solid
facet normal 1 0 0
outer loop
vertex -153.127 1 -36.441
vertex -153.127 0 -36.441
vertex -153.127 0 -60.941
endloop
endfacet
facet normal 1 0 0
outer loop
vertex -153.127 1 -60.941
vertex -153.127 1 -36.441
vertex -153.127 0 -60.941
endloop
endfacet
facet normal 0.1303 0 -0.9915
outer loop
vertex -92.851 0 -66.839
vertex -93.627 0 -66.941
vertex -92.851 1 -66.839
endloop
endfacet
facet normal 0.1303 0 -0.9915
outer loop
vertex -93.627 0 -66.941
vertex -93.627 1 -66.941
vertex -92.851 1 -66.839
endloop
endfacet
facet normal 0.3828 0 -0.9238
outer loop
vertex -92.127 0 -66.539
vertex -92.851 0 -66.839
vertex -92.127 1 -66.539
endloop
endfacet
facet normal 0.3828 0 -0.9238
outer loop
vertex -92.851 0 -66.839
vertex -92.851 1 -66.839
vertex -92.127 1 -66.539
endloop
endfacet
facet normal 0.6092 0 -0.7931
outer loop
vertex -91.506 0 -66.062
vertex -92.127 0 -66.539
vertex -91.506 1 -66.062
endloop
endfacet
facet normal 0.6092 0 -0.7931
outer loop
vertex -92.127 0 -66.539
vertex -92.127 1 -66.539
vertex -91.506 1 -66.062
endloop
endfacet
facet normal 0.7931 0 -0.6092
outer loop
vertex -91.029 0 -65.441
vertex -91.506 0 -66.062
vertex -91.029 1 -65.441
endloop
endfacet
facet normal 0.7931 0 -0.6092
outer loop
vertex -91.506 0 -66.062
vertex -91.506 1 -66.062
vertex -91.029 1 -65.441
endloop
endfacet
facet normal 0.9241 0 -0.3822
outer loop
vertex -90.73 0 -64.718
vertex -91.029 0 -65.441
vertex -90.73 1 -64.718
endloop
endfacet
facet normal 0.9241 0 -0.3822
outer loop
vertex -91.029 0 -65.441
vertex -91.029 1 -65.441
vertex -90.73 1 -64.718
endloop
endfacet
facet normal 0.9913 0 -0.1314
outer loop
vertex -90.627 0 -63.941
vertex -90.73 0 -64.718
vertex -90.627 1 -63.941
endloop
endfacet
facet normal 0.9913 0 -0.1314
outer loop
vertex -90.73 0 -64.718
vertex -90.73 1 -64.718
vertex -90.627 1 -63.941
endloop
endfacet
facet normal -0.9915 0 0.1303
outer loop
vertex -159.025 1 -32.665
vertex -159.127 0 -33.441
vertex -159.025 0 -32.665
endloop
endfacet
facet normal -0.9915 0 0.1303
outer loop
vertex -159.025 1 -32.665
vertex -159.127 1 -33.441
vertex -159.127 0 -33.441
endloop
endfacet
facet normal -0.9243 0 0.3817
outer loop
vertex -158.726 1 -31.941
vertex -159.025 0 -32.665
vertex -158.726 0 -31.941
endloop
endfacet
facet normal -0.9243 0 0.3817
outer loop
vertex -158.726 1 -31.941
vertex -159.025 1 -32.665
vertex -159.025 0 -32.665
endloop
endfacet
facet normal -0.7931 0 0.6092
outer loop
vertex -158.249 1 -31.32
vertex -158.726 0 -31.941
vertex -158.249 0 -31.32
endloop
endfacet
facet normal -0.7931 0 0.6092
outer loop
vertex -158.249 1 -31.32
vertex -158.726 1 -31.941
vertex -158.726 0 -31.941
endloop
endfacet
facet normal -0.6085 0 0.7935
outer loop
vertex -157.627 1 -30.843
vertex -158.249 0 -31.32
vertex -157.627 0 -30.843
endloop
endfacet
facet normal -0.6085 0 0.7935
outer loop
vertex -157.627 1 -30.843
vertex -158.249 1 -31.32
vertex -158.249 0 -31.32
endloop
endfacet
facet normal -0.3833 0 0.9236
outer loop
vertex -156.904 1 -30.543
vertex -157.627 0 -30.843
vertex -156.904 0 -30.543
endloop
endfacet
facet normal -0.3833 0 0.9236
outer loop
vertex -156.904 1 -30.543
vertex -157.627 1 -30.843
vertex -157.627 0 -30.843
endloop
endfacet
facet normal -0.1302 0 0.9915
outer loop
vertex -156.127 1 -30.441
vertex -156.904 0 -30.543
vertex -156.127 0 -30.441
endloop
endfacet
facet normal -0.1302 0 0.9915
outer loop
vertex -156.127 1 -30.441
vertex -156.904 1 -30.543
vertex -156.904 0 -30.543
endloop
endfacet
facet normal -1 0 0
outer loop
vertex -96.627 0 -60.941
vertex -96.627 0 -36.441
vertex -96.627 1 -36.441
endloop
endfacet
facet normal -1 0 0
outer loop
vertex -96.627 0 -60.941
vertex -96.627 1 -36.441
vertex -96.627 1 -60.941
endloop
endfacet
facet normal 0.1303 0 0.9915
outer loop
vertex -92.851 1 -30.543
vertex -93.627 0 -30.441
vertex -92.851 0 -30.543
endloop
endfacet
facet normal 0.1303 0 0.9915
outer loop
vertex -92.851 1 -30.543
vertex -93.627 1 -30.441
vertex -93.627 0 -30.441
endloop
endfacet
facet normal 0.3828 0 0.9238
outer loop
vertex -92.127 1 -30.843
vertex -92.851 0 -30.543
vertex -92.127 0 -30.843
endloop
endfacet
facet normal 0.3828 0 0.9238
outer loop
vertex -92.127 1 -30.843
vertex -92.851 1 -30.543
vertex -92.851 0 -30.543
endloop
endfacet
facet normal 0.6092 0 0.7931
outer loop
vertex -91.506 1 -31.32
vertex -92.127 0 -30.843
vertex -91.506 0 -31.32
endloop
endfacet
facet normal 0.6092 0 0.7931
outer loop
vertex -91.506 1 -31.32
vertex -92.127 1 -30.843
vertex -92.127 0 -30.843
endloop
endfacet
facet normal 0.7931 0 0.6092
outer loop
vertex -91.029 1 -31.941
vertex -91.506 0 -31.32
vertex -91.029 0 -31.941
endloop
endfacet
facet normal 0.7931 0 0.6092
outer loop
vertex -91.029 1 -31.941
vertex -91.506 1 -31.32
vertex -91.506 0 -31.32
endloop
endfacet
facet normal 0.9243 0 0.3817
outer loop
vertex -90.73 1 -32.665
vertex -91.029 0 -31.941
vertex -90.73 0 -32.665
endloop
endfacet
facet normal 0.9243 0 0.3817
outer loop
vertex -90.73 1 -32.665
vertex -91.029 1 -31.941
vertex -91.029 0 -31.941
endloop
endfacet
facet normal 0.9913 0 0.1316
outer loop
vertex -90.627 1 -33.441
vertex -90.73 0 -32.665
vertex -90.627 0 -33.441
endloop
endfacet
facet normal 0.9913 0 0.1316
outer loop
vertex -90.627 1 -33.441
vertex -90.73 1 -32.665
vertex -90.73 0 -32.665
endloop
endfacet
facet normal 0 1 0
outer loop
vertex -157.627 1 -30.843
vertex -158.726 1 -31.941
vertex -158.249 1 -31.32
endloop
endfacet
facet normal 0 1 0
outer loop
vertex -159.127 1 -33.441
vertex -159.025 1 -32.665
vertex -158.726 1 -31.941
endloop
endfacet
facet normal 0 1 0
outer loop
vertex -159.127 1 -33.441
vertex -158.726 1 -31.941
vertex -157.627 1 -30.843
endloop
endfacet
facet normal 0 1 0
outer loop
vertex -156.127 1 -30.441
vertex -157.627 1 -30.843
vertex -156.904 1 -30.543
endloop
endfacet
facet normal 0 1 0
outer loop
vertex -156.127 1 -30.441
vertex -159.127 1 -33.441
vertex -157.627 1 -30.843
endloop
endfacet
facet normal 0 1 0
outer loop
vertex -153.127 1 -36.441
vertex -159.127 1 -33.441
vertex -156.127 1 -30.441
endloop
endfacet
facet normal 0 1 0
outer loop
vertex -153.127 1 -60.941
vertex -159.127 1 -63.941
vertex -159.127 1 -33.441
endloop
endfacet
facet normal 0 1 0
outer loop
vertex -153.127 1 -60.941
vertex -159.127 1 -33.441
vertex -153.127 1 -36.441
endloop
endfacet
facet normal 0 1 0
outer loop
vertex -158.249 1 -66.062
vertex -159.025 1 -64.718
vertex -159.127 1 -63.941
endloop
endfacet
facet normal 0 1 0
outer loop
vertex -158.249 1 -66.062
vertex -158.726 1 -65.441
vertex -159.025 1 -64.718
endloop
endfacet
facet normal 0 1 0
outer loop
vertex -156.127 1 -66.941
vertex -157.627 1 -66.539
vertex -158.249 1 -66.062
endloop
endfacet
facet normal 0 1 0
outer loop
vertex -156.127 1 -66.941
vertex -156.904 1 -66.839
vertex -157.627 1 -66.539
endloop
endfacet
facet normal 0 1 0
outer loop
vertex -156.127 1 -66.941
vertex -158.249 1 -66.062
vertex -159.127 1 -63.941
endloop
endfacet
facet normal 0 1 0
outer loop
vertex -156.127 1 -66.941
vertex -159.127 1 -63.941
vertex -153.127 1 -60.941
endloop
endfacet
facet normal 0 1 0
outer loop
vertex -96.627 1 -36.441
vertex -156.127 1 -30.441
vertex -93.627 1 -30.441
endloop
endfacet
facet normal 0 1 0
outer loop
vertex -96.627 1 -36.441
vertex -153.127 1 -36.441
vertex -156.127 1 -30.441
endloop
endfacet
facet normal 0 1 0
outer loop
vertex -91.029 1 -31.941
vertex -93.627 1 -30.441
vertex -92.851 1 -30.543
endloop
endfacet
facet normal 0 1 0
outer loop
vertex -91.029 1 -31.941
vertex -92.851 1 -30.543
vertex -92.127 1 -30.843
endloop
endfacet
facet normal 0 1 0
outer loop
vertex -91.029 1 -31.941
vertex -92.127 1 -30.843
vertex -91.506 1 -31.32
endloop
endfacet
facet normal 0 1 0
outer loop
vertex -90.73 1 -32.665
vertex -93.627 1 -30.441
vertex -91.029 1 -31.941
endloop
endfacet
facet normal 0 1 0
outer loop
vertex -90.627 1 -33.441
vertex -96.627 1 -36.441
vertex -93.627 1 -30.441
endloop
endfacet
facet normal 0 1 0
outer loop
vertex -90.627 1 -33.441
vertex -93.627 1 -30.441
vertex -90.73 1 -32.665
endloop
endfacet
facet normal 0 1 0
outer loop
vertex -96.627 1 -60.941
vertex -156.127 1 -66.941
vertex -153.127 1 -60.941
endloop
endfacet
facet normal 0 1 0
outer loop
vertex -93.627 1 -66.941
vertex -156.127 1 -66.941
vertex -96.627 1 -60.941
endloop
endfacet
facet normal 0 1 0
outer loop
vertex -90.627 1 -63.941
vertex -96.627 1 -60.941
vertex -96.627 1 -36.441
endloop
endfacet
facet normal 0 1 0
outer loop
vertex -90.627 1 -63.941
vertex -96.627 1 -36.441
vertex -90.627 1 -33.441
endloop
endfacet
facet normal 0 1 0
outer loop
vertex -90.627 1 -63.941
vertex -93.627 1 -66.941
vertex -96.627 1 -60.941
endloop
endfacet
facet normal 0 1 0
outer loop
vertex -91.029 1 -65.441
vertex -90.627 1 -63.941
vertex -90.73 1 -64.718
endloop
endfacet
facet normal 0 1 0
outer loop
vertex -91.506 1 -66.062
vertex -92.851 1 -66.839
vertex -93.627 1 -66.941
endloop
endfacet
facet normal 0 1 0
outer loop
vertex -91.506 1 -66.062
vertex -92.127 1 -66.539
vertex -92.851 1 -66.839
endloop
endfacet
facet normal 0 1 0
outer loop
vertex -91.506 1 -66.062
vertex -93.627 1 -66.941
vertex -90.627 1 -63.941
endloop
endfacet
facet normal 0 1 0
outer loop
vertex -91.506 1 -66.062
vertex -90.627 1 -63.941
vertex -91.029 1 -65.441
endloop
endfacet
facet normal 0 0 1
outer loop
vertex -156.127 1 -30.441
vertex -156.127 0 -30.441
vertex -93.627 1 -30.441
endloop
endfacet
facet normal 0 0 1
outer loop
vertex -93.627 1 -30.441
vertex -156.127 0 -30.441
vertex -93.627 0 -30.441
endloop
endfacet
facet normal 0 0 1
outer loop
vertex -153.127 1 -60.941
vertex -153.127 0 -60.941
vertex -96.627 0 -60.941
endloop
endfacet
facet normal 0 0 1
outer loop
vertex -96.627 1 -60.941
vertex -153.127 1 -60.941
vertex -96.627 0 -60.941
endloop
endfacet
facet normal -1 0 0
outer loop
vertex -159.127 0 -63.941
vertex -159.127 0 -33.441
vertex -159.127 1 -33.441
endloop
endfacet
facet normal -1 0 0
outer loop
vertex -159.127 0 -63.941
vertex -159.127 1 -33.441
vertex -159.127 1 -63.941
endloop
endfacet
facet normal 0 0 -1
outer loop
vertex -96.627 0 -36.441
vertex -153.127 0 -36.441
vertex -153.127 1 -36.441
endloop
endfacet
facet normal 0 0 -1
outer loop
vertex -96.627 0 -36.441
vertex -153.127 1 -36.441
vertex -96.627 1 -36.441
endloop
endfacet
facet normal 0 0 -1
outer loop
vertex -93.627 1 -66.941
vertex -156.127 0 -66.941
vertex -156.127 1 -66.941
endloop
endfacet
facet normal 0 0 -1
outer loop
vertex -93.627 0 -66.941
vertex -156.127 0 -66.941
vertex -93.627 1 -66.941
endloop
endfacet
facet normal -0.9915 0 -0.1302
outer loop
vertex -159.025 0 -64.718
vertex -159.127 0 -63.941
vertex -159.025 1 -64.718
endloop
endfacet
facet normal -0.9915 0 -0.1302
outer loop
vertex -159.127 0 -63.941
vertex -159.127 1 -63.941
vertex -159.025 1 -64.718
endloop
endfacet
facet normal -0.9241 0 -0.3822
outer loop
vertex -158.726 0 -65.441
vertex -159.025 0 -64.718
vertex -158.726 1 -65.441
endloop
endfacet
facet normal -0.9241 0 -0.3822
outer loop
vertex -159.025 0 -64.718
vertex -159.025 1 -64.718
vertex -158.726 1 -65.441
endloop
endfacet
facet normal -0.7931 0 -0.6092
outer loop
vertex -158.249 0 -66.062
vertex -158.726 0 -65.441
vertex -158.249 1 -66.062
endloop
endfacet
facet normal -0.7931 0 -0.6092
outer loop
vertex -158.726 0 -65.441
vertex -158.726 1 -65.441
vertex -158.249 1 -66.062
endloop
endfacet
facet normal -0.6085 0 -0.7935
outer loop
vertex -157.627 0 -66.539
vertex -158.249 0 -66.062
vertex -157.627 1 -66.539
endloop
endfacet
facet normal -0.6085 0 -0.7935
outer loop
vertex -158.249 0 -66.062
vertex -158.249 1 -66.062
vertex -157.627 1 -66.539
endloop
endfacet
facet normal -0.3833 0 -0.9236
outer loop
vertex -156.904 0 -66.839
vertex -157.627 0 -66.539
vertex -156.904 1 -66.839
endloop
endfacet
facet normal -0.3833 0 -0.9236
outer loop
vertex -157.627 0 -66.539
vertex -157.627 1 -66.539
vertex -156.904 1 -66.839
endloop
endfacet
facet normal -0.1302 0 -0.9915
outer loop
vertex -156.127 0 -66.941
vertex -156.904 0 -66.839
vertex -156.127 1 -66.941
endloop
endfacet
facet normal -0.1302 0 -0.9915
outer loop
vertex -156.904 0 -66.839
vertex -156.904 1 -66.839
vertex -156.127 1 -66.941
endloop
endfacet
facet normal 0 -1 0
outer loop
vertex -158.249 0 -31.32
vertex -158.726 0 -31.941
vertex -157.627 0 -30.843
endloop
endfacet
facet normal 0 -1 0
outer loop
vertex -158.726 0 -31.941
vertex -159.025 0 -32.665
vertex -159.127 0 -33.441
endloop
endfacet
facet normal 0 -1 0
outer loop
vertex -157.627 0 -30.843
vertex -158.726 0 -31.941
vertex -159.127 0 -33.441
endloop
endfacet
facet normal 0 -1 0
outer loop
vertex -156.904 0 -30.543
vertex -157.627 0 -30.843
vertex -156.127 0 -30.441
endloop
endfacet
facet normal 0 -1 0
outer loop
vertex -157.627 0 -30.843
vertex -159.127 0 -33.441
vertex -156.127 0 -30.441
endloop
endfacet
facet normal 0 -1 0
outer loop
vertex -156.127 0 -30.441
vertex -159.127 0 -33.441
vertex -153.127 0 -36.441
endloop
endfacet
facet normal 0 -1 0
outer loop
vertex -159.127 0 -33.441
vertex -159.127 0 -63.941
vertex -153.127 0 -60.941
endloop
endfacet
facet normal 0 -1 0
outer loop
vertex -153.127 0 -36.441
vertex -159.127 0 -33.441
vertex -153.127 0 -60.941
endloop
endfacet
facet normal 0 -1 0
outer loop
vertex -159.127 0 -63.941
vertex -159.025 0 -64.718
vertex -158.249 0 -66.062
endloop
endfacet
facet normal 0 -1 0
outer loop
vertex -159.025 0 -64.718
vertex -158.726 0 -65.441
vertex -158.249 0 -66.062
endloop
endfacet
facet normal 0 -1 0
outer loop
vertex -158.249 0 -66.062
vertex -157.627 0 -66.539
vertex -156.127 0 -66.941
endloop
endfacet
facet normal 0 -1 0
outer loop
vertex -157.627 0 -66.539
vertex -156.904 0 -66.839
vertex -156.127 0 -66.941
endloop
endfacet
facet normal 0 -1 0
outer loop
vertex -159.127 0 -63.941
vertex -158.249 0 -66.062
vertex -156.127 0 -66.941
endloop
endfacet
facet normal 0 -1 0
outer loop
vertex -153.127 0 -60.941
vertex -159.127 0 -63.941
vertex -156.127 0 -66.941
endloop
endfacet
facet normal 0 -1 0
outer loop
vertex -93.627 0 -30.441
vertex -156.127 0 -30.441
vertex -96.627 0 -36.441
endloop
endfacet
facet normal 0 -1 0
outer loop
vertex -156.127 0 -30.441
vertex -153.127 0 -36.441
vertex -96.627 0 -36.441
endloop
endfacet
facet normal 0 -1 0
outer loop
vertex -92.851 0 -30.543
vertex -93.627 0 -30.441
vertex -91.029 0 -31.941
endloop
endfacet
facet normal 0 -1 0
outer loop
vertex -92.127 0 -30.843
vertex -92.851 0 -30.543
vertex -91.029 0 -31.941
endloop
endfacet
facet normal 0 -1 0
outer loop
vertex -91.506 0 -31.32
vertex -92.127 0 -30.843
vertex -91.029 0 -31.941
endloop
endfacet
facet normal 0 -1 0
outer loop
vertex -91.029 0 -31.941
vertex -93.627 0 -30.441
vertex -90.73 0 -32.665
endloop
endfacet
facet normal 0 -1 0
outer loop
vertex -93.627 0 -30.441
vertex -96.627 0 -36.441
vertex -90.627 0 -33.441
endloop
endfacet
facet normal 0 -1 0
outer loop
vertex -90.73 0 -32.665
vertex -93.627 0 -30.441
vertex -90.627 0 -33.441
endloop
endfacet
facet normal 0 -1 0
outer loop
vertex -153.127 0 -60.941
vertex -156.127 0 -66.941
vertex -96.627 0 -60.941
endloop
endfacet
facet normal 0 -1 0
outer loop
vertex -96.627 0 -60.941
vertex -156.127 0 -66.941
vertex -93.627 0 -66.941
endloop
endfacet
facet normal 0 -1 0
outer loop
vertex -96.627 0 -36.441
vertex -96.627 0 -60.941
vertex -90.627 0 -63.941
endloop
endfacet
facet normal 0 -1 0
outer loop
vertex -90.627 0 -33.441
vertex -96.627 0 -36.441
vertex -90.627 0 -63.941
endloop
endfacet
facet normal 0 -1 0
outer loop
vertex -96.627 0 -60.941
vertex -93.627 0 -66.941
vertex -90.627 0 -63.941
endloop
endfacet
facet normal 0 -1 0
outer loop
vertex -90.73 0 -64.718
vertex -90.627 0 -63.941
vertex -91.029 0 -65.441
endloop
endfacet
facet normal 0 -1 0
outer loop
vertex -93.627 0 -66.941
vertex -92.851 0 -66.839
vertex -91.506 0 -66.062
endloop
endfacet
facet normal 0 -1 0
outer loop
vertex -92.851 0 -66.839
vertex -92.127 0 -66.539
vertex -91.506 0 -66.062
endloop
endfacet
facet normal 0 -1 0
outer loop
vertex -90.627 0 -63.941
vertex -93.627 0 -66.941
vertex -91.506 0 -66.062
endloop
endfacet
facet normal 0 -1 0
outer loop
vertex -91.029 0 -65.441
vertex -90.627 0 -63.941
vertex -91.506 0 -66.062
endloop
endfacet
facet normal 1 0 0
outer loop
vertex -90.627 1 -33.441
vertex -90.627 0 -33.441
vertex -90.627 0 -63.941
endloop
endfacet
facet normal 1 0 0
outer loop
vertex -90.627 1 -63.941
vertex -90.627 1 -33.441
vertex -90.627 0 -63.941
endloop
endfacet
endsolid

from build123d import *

# Parameters (mm, degrees)
SKETCH_1_W      = 68.5
SKETCH_1_H      = 36.5
SKETCH_1_W_2    = 56.5
SKETCH_1_H_2    = 24.5
EXTRUDE_1_DEPTH = 1
FILLET_1_R      = 3


with BuildPart() as part:
    # 草图1 → 凸台-拉伸1 (new body)
    with BuildSketch(Plane(origin=(0, 0, 0), x_dir=(1, 0, 0), z_dir=(0, 1, 0))):
        with Locations((-124.87745098, 48.691176471)):
            Rectangle(SKETCH_1_W, SKETCH_1_H)
        with Locations((-124.87745098, 48.691176471)):
            Rectangle(SKETCH_1_W_2, SKETCH_1_H_2, mode=Mode.SUBTRACT)
    extrude(amount=EXTRUDE_1_DEPTH)

    # 圆角1
    fillet_1_edges = [part.edges().sort_by_distance(p)[0] for p in [
        (-159.12745098, 0.5, -66.941176471),
        (-90.62745098, 0.5, -66.941176471),
        (-90.62745098, 0.5, -30.441176471),
        (-159.12745098, 0.5, -30.441176471),
    ]]
    fillet(fillet_1_edges, radius=FILLET_1_R)


solid = part.part
